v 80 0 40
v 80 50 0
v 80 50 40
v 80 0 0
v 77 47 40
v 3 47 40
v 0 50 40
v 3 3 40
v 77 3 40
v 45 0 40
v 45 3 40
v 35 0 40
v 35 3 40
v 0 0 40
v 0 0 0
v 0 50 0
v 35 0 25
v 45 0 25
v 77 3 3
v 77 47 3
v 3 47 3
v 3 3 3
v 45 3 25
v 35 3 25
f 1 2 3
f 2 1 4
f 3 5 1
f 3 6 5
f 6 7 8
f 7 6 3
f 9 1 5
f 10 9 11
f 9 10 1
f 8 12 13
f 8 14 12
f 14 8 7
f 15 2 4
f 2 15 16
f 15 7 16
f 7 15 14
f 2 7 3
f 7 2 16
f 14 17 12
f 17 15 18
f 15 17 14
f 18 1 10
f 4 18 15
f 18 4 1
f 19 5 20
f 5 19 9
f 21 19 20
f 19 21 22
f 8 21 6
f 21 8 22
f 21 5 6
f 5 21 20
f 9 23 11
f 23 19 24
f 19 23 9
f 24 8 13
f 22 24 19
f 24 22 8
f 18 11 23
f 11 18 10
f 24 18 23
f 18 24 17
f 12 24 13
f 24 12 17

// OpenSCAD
$fn = 32;

// ----------------------------------------------------------------------
// Enclosure box: notch enclosure
// ----------------------------------------------------------------------

// --- parameters (mm) ---
box_l = 80;               // outer length, X
box_w = 50;               // outer width, Y
box_h = 40;               // outer height
wall_t = 3;               // wall thickness
notch_w = 10;             // cable notch width
notch_h = 15;             // cable notch height

inner_h = box_h - wall_t;  // cavity depth
boss_h = inner_h - 2;  // corner boss height

difference() {
  cube([box_l, box_w, box_h]);
  translate([wall_t, wall_t, wall_t])
    cube([box_l - 2 * wall_t, box_w - 2 * wall_t, box_h]);
  translate([box_l / 2 - notch_w / 2, -1, box_h - notch_h])
    cube([notch_w, wall_t + 2, notch_h + 1]);
}
